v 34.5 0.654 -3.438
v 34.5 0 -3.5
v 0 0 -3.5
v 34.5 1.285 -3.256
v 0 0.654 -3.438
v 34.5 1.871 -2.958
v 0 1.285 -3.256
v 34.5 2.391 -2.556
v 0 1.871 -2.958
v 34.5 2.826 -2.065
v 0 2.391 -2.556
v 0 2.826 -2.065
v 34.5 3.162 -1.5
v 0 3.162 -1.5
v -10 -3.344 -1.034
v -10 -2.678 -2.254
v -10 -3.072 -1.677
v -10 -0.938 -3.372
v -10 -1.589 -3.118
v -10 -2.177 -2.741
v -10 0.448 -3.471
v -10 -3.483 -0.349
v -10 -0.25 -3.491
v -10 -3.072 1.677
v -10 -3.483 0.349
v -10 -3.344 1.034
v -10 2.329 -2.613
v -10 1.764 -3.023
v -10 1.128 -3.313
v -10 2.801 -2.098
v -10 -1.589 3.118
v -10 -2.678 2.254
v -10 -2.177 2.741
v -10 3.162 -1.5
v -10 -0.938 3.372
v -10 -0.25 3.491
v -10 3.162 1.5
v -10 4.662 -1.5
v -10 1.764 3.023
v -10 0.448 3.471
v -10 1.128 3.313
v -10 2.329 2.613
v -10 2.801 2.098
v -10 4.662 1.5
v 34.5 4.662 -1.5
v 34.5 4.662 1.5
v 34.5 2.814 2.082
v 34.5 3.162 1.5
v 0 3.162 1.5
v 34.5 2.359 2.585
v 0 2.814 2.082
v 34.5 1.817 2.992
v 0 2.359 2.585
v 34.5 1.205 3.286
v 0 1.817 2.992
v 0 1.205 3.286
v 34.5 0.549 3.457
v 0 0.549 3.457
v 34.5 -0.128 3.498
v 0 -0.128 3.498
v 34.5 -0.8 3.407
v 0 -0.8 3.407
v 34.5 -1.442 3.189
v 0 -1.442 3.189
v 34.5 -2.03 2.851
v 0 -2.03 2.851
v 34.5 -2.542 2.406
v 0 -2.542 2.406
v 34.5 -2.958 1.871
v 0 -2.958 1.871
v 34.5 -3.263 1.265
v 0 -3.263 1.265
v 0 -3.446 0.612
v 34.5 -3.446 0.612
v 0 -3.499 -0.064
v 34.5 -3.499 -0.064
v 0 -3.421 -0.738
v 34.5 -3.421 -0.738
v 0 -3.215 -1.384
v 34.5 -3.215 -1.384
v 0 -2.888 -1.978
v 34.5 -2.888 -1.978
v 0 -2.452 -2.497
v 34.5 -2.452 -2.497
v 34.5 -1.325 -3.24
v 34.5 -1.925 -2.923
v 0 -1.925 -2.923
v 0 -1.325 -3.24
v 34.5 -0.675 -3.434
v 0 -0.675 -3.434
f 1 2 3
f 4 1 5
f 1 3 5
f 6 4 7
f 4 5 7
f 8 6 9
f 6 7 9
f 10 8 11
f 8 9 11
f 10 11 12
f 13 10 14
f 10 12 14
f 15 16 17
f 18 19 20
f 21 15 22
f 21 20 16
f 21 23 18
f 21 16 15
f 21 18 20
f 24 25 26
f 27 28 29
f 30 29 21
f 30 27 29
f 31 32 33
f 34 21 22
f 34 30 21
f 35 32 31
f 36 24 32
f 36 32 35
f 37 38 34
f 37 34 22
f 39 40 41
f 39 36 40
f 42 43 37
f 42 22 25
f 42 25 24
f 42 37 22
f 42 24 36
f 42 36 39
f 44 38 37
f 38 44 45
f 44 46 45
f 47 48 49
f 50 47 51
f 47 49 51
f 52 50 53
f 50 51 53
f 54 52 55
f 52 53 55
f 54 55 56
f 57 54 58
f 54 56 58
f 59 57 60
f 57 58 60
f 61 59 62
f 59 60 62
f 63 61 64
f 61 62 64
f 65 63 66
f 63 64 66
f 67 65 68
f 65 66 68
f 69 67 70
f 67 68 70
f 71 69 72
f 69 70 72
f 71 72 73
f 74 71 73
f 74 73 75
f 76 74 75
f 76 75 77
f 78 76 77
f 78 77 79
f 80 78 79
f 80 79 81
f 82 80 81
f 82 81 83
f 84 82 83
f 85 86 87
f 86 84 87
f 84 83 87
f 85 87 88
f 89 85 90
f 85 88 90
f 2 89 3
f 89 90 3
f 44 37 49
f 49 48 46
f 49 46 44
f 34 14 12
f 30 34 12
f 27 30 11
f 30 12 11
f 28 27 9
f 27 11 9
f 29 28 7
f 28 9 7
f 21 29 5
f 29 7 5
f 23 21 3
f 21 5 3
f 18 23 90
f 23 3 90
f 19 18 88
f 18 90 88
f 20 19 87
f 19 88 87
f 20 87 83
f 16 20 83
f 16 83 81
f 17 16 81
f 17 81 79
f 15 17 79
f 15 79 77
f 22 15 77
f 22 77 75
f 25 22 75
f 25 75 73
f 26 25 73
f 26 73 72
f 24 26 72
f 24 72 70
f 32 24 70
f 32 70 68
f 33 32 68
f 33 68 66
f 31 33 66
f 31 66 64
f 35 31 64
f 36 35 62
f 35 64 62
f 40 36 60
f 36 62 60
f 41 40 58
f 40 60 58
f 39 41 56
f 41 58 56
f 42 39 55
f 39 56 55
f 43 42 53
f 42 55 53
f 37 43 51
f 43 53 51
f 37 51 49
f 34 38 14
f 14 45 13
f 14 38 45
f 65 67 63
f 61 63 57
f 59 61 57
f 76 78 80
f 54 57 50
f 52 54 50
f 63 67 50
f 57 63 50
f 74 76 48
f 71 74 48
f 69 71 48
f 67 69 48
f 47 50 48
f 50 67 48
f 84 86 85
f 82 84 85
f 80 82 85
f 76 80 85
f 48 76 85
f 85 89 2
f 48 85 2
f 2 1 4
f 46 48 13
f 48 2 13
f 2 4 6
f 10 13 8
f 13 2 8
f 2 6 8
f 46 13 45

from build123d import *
from build123d.topology import SkipClean

# Parameters (mm, degrees)
BOSS_EXTRU_1_DEPTH           = 50
ENL_V_START                  = -6
ENL_V_MAT_EXTRU_1_DEPTH      = 6
ESQUISSE5_R                  = 3.5
BOSS_EXTRU_2_DEPTH           = 10
ENL_V_MAT_EXTRU_2_DEPTH      = 10
ENL_V_MAT_EXTRU_2_DEPTH_BACK = 10
ESQUISSE6_W                  = 18.121424082
ESQUISSE6_H                  = 16.818170981
BOSS_EXTRU_3_DEPTH           = 16


with BuildPart() as part:
    # Esquisse1 → Boss.-Extru.1 (new body)
    with BuildSketch(Plane(origin=(0, 0, 0), x_dir=(0, 0, -1), z_dir=(1, 0, 0))):
        with BuildLine():
            ThreePointArc((1.5, 3.16227766), (0, 3.5), (-1.5, 3.16227766))
            Line((-1.5, 3.16227766), (1.5, 3.16227766))
        make_face()
        with BuildLine():
            Line((1.5, 3.16227766), (-1.5, 3.16227766))
            ThreePointArc((-1.5, 3.16227766), (-1.870828693, -2.958039892), (3.5, 0))
            ThreePointArc((3.5, 0), (2.958039892, 1.870828693), (1.5, 3.16227766))
        make_face()
        with BuildLine():
            Line((-1.5, 4.66227766), (-1.5, 3.16227766))
            ThreePointArc((-1.5, 3.16227766), (0, 3.5), (1.5, 3.16227766))
            Line((1.5, 3.16227766), (1.5, 4.66227766))
            Line((1.5, 4.66227766), (-1.5, 4.66227766))
        make_face()
    extrude(amount=BOSS_EXTRU_1_DEPTH)

    # Esquisse4 → Enlèv. mat.-Extru.1 (cut)
    with BuildSketch(Plane(origin=(50, 0, 0), x_dir=(0, 0, -1), z_dir=(1, 0, 0)).offset(ENL_V_START)):
        with BuildLine():
            Line((-1.5, 3.16227766), (-1.5, 4.66227766))
            Line((-1.5, 4.66227766), (1.5, 4.66227766))
            Line((1.5, 4.66227766), (1.5, 3.16227766))
            ThreePointArc((1.5, 3.16227766), (0, 3.5), (-1.5, 3.16227766))
        make_face()
    enl_v_mat_extru_1 = extrude(amount=ENL_V_MAT_EXTRU_1_DEPTH, mode=Mode.SUBTRACT)

    # Symétrie1: Enlèv. mat.-Extru.1 across plane
    with SkipClean():  # the faces are left unmerged after this step: merging them gives an invalid solid
        add(enl_v_mat_extru_1.mirror(Plane(origin=(25, 0, 0), x_dir=(0, 0, 1), z_dir=(1, 0, 0))), mode=Mode.SUBTRACT)

    # Esquisse5 → Boss.-Extru.2 (add)
    with SkipClean():  # the faces are left unmerged after this step: merging them gives an invalid solid
        with BuildSketch(Plane.ZY):
            Circle(ESQUISSE5_R)
        extrude(amount=BOSS_EXTRU_2_DEPTH)

    # Esquisse6 → Enlèv. mat.-Extru.2 (cut, two sides: drawn at the far end of the back side and taken through both)
    with SkipClean():  # the faces are left unmerged after this step: merging them gives an invalid solid
        with BuildSketch(Plane.XY.offset(-ENL_V_MAT_EXTRU_2_DEPTH_BACK)):
            with Locations((43.560712041, -0.183428049)):
                Rectangle(ESQUISSE6_W, ESQUISSE6_H)
        extrude(amount=ENL_V_MAT_EXTRU_2_DEPTH + ENL_V_MAT_EXTRU_2_DEPTH_BACK, mode=Mode.SUBTRACT)

    # Esquisse8 → Boss.-Extru.3 (add)
    with BuildSketch(Plane.ZY.offset(-6)):
        with BuildLine():
            Line((1.5, 3.16227766), (1.5, 4.66227766))
            Line((1.5, 4.66227766), (-1.5, 4.66227766))
            Line((-1.5, 4.66227766), (-1.5, 3.16227766))
            ThreePointArc((-1.5, 3.16227766), (0, 3.5), (1.5, 3.16227766))
        make_face()
    extrude(amount=BOSS_EXTRU_3_DEPTH)


solid = part.part
